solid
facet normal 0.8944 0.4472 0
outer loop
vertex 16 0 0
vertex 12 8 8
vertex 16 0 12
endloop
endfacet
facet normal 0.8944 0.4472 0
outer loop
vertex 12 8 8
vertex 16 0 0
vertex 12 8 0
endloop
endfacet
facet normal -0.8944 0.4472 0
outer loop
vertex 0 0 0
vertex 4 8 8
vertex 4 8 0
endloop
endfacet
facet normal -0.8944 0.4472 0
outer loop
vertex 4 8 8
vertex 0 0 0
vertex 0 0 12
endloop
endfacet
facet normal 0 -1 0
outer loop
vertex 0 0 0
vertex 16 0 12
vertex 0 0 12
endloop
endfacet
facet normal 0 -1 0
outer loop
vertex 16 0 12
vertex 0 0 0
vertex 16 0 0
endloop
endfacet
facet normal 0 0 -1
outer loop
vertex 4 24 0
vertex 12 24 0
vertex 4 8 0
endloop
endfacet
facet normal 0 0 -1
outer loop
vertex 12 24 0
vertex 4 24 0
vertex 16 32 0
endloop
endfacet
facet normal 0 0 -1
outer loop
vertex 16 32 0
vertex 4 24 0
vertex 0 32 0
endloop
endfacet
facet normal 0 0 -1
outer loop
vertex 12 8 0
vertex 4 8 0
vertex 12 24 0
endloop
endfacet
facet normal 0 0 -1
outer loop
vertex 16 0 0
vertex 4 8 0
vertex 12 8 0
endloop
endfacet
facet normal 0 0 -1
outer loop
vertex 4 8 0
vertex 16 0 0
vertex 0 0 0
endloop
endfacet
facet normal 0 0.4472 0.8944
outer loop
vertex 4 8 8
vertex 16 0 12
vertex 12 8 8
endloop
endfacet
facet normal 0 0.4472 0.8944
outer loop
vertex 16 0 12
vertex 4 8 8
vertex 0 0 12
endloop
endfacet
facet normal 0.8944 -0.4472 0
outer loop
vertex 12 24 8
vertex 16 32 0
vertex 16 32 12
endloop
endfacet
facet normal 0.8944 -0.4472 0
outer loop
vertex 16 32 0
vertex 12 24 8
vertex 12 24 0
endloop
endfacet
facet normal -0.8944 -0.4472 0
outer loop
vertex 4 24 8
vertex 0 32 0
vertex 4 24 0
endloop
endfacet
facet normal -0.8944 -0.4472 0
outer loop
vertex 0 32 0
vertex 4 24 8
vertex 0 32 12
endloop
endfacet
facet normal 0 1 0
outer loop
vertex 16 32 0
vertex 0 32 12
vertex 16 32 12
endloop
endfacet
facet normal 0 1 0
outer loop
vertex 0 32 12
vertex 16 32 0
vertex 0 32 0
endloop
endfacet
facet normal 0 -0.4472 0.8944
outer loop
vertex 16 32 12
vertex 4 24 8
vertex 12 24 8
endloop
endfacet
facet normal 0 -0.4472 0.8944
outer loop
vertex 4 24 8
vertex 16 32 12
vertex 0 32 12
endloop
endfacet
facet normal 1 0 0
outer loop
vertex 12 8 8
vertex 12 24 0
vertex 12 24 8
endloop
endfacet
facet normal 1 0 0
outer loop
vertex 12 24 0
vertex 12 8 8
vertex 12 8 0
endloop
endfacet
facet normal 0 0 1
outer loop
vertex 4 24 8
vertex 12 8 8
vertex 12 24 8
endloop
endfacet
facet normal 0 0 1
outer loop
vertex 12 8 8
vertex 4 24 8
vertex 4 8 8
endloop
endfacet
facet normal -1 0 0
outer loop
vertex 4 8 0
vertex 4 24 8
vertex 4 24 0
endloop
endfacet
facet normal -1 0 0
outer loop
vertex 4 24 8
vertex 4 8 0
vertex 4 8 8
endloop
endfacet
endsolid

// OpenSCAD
// unit = 1/32"

headCore = 8;

headSpread = 4;
headRise = 4;
headHeight = headCore + headRise;
headWidth = headCore + (2 * headSpread);
headDepth = headCore;

gap = 16;
armLength = gap + (headDepth * 2);

module head() {
    intersection() {
        linear_extrude(headHeight) polygon ([[0,0], [headWidth,0],[headWidth-headSpread,headDepth],[headSpread,headDepth]]);
         
        translate([headWidth,headDepth,0]) 
            rotate([90,0,270]) 
                linear_extrude(headWidth) 
                    polygon([[0,0], [headDepth, 0], [headDepth,headHeight], [0,headHeight-headRise]]);
    }
}


union() {
    head();
    translate([0,armLength,0]) mirror([0,1,0]) head();
    translate([headSpread,0,0]) cube([headCore,armLength,headCore]);
}

// this shape can be used to hollow out the arm is needed
// translate([1+headSpread,-1,1])         cube([headCore - 2, armLength + 2, headCore - 2]);
